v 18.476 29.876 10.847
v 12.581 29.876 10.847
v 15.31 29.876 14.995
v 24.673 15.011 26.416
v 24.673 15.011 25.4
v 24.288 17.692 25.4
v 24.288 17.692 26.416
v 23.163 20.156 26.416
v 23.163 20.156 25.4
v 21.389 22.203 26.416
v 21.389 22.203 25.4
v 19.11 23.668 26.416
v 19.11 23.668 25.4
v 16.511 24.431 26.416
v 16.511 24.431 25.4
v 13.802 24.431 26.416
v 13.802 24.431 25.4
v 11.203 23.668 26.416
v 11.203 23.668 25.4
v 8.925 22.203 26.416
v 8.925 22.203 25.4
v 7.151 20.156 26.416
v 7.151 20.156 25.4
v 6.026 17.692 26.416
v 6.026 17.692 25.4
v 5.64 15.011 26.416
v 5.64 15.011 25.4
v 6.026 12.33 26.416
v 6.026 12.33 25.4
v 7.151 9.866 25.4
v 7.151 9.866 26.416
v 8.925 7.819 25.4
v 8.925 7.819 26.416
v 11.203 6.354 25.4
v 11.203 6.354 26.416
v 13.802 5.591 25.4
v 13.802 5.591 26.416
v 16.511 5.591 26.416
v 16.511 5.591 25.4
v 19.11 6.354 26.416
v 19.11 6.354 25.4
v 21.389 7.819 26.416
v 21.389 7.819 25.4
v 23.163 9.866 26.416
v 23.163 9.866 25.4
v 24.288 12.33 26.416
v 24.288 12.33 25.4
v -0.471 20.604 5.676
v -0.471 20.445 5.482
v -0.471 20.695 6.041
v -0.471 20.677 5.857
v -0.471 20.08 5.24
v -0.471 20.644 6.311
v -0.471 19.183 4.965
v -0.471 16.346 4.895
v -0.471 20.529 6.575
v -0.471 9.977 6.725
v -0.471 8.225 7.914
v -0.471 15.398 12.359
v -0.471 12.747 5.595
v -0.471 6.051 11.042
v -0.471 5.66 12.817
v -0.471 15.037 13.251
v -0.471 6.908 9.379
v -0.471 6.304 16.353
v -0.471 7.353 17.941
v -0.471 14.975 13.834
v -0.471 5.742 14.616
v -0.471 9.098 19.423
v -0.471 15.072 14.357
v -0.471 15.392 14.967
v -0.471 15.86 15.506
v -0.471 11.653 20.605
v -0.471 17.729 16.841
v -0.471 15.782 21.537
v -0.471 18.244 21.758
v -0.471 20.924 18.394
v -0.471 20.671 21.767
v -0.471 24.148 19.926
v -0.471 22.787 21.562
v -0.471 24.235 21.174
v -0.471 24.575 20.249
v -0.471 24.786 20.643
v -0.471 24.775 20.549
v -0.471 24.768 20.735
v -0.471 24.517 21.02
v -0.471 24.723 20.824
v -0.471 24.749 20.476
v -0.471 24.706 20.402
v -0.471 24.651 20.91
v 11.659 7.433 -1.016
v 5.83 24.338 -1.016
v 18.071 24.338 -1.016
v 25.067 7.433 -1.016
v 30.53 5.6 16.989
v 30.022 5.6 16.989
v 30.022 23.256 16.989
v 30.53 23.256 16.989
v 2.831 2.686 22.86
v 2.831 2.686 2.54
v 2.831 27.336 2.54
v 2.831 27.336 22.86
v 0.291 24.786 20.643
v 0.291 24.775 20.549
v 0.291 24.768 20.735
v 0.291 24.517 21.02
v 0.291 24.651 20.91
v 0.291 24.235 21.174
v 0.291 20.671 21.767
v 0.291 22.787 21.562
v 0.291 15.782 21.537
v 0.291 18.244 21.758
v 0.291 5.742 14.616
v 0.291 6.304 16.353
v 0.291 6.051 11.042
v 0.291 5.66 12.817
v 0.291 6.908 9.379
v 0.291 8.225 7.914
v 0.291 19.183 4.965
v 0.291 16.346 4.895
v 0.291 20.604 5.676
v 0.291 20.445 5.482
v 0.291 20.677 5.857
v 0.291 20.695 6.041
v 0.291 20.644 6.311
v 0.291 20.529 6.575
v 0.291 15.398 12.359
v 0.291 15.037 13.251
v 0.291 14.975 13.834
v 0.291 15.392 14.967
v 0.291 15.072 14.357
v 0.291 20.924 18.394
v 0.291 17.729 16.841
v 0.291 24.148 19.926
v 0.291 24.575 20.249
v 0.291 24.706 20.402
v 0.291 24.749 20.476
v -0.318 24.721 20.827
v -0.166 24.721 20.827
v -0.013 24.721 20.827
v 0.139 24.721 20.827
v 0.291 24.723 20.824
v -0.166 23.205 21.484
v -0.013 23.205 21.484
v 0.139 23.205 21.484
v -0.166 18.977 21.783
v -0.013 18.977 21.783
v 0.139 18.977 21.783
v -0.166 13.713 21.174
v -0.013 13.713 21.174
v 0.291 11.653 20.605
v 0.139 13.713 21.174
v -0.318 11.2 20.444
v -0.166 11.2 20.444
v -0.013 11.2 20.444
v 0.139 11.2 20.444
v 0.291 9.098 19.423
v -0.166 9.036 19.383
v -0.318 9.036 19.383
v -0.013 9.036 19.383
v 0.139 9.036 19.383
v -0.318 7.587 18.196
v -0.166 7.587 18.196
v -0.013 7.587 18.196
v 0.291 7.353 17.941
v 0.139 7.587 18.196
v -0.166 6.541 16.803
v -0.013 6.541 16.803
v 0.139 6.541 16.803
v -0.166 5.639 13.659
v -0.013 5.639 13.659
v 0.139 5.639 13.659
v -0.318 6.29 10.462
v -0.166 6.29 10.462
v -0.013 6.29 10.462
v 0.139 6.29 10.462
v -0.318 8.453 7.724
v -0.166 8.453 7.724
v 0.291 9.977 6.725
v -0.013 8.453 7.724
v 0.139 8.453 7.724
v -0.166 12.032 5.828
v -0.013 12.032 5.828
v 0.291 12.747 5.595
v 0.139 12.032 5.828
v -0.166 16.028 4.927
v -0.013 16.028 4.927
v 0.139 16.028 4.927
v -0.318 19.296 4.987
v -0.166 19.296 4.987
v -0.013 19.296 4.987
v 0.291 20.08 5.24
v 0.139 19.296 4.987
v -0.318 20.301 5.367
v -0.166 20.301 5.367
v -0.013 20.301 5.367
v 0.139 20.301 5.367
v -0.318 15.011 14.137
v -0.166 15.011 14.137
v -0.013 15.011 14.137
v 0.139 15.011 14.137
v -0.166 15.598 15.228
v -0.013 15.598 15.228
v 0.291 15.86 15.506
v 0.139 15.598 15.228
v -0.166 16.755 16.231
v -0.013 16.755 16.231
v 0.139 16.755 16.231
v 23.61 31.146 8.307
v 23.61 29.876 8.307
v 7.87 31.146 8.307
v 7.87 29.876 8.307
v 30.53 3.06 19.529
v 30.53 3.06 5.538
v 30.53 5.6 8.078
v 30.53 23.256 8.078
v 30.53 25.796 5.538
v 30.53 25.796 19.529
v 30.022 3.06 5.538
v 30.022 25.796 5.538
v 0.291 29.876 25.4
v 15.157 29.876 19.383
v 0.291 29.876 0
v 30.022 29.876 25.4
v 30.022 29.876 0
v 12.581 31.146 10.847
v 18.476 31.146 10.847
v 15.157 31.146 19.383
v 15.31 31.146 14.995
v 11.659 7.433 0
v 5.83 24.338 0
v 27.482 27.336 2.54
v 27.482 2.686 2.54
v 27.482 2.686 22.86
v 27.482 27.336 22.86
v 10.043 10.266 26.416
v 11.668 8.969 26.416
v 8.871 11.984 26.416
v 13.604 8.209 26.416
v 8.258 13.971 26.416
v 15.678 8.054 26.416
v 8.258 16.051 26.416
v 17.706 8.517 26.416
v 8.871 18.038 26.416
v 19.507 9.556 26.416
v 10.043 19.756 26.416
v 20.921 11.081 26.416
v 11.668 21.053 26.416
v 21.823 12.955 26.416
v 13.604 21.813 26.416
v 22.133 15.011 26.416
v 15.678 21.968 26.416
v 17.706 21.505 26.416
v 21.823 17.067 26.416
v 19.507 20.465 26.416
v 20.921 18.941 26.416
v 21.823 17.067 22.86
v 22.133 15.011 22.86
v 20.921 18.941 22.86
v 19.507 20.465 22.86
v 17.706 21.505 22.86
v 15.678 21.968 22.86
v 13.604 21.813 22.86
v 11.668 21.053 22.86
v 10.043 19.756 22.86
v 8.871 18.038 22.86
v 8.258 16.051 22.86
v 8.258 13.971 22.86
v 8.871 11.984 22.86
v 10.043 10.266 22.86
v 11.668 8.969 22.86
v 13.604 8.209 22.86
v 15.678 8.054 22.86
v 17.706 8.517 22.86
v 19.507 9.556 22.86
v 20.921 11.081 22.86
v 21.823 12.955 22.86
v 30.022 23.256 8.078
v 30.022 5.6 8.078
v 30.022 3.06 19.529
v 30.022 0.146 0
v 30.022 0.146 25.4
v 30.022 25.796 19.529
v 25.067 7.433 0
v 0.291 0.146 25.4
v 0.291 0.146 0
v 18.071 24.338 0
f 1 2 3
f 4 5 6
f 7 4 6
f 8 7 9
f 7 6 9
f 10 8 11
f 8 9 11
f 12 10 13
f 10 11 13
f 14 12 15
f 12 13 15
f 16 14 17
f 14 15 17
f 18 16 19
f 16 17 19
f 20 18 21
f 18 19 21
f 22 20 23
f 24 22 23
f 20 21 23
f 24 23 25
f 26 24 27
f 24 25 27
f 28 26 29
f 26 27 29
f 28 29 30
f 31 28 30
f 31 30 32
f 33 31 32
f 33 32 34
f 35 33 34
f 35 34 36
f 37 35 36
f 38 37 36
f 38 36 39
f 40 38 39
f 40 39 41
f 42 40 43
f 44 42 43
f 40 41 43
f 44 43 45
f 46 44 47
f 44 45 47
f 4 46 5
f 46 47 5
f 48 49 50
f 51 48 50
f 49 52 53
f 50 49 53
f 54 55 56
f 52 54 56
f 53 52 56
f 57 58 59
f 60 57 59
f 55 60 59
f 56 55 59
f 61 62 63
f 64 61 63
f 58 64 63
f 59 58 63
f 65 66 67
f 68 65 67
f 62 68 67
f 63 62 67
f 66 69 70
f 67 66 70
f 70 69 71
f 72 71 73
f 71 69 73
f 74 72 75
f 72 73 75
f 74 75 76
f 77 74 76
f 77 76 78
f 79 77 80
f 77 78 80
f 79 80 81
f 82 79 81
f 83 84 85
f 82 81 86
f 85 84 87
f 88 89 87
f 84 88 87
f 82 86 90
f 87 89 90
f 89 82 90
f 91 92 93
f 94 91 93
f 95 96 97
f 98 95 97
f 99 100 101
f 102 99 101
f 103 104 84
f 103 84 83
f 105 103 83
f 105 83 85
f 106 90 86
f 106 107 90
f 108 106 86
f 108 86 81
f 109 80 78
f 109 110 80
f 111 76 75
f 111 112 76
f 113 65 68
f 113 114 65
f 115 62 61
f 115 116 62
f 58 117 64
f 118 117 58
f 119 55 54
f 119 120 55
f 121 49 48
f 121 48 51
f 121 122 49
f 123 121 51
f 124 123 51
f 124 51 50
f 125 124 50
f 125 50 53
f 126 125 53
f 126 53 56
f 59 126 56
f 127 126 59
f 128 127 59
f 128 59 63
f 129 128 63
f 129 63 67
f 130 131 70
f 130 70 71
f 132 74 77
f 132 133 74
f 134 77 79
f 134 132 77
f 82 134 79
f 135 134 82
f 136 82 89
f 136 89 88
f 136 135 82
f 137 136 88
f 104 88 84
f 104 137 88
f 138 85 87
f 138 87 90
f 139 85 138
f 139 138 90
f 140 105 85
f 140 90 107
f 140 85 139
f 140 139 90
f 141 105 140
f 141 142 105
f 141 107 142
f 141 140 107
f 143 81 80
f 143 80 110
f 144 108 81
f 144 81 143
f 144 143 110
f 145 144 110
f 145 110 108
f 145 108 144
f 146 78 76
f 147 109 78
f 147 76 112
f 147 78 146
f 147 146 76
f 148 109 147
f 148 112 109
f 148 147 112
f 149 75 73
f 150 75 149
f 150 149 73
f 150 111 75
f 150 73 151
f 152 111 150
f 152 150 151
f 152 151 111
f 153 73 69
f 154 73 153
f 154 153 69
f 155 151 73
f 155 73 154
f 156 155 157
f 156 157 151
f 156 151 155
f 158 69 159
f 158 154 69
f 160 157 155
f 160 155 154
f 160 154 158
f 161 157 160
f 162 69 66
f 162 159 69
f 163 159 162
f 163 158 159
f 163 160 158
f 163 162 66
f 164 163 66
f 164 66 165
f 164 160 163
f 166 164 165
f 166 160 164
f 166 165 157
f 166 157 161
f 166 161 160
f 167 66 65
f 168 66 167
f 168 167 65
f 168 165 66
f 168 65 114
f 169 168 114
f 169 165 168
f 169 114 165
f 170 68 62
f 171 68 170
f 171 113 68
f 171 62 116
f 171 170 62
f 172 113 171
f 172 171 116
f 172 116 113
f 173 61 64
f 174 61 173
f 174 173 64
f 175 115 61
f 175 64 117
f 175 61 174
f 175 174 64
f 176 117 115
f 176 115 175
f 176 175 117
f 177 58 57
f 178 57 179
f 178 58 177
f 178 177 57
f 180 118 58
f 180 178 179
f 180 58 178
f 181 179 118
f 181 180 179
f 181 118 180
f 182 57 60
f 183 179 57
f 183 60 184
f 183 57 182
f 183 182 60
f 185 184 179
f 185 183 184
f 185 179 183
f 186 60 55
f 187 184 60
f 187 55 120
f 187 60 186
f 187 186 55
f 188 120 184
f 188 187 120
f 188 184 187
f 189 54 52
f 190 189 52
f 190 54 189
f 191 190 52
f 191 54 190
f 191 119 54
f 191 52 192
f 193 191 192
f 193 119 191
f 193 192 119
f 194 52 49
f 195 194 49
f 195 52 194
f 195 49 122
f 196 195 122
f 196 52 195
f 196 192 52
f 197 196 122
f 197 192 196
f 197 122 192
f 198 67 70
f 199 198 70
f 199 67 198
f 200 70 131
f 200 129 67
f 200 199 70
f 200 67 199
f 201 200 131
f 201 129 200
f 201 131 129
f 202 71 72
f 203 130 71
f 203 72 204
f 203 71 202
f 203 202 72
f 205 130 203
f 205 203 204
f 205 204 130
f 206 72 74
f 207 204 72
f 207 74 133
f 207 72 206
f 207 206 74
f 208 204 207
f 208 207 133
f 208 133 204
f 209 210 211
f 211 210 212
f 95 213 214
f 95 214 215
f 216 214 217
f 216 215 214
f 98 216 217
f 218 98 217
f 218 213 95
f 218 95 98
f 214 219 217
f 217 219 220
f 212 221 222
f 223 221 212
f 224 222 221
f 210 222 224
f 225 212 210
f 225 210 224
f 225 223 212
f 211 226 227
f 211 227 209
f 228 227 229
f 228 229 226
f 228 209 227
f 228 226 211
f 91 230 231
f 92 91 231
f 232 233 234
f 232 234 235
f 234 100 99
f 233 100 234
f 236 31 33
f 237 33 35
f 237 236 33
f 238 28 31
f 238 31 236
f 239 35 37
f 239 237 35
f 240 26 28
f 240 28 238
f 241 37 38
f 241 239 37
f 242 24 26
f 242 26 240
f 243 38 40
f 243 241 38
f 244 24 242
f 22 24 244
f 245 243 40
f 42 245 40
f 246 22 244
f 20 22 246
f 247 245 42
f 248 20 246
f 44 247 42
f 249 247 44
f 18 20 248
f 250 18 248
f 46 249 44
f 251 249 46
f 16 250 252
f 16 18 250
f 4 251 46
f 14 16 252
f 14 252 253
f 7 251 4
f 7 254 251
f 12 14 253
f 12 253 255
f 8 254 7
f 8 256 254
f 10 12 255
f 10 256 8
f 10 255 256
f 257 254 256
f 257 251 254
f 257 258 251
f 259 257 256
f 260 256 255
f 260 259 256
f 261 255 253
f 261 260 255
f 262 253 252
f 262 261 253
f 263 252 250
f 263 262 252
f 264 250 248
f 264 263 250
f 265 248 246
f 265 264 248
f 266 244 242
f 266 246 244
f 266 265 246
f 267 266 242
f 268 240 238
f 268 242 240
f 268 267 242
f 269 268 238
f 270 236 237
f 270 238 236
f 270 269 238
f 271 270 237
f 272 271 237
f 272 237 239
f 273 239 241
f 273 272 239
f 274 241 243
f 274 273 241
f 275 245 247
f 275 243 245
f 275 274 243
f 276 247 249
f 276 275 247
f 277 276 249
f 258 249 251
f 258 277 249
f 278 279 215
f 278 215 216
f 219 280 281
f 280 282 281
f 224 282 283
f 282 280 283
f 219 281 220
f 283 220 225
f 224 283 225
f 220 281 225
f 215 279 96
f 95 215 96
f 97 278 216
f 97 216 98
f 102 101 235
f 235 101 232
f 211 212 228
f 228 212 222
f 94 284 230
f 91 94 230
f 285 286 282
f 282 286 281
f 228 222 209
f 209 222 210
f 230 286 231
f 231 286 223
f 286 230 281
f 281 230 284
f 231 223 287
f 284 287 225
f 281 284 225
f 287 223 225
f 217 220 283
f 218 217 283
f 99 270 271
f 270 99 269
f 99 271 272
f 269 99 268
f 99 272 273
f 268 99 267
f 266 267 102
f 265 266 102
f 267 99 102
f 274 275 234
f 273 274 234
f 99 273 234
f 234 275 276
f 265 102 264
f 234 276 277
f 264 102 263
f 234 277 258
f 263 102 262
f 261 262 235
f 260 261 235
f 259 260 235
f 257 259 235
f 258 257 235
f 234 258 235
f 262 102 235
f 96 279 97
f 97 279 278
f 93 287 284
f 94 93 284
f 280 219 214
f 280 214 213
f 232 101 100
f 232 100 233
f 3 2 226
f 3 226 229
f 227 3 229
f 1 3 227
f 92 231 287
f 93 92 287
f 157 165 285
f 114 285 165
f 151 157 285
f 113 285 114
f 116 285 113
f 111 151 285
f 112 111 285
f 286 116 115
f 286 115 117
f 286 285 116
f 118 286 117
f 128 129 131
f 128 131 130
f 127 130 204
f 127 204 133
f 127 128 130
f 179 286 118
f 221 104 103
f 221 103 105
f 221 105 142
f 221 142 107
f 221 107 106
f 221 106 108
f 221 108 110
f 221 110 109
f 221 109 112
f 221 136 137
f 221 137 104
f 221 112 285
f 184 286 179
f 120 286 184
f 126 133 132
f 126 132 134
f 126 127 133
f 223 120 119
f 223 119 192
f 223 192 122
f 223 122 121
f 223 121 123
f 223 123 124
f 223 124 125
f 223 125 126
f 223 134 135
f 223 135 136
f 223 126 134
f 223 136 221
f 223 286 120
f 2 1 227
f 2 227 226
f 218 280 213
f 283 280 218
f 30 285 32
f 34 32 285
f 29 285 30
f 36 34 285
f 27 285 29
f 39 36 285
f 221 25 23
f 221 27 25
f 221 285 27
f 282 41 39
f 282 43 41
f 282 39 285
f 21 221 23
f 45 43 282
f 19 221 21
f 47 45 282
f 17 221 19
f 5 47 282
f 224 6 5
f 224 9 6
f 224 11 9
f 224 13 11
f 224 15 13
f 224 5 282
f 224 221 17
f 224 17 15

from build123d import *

# Parameters (mm, degrees)
F0_W          = 29.7304940177
F0_H          = 29.7304925771
F1_DEPTH      = 25.4
F2_R          = 9.516573444
F3_DEPTH      = 1.016
F4_T          = -2.54
F5_W          = 22.7350834757
F5_H          = 13.9908185229
F6_DEPTH      = 0.508
F7_T          = 2.54
F7_T3_DEPTH   = 25.4
F7_T5_DEPTH   = 29.7304925771
F7_T7_DEPTH   = 29.7304940177
F7_T9_DEPTH   = 27.8150834757
F7_T11_DEPTH  = 19.0708185229
F9_DEPTH      = 1.27
F10_T         = 2.54
F10_T3_DEPTH  = 25.4
F10_T5_DEPTH  = 29.7304925771
F10_T7_DEPTH  = 29.7304940177
F10_T9_DEPTH  = 20.819671886
F10_T11_DEPTH = 19.0130124822
F10_T13_DEPTH = 18.3381282199
F10_T15_DEPTH = 27.8150834757
F10_T17_DEPTH = 19.0708185229
F10_T19_DEPTH = 22.7350834757
F10_T21_DEPTH = 5.588
F10_T23_DEPTH = 13.9908185229
F12_DEPTH     = 1.016
F14_DEPTH     = 0.762


# Not quite as in the source:
# - a shell that OpenCascade refuses in one call is made with other operations: the cavity is built on its own and cut out


with BuildPart() as f1:
    # F0 (on Top) → F1 (new body)
    with BuildSketch(Plane.XY):
        with Locations((15.1567222201, 15.010983996)):
            Rectangle(F0_W, F0_H)
    extrude(amount=F1_DEPTH)

    # F2 (on face) → F3 (join)
    with BuildSketch(Plane.XY.offset(25.4)):
        with Locations((15.1567222201, 15.010983996)):
            Circle(F2_R)
    extrude(amount=F3_DEPTH)

    # F4
    f4_openings = [f1.faces().sort_by_distance(p)[0] for p in [
        (15.156722, 15.010984, 26.416),
    ]]
    offset(amount=F4_T, openings=f4_openings, kind=Kind.INTERSECTION)

    # F5 (on face) → F6 (join)
    with BuildSketch(Plane.YZ.offset(30.021969229)):
        with Locations((14.4280334935, 12.5334435143)):
            Rectangle(F5_W, F5_H)
    extrude(amount=F6_DEPTH)

    # F7: shell of thickness 2.54, made by hand


with BuildPart() as f7_core1:
    # F7_t2: copy of F1
    add(f1.part)

    # the walls: a layer under each face that stays
    f7_faces = [f7_core1.faces().sort_by_distance(p)[0] for p in [
        (2.8314752113, 15.010983996, 12.7),
        (15.1567222201, 27.3362302846, 12.7),
        (6.9398908809, 6.794153137, 22.86),
        (15.1567222201, 2.6857377075, 12.7),
        (15.1567222201, 15.010983996, 2.54),
        (27.481969229, 15.010983996, 12.7),
        (8.1801487762, 15.010983996, 24.638),
        (8.8123399241, 8.6666017001, 26.416),
        (5.6401487762, 15.010983996, 25.908),
        (5.2465575476, 5.1008198037, 25.4),
        (0.2914752113, 15.010983996, 12.7),
        (15.1567222201, 29.8762302846, 12.7),
        (15.1567222201, 0.1457377075, 12.7),
        (30.021969229, 5.1008198037, 21.1666666667),
        (15.1567222201, 15.010983996, 0),
        (30.275969229, 14.4280334935, 5.5380342528),
        (30.275969229, 3.0604917556, 12.5334435143),
        (30.275969229, 14.4280334935, 19.5288527757),
        (30.275969229, 25.7955752313, 12.5334435143),
    ]]
    thicken(f7_faces, amount=-F7_T, mode=Mode.SUBTRACT)

    # F7_s4 → F7_t3 (cut)
    with BuildSketch(Plane.XY):
        Polygon((2.8568752113, 27.3108302846), (0.2914752113, 27.3362302846), (0.2914752113, 29.8762302846), (2.8314752113, 29.8762302846), align=None)
        Polygon((2.8568752113, 2.7111377075), (0.2914752113, 2.6857377075), (0.2914752113, 0.1457377075), (2.8314752113, 0.1457377075), align=None)
        Polygon((27.456569229, 27.3108302846), (27.481969229, 29.8762302846), (30.021969229, 29.8762302846), (30.021969229, 27.3362302846), align=None)
        Polygon((27.456569229, 2.7111377075), (27.481969229, 0.1457377075), (30.021969229, 0.1457377075), (30.021969229, 2.6857377075), align=None)
    extrude(amount=F7_T3_DEPTH, mode=Mode.SUBTRACT)

    # F7_s6 → F7_t5 (cut)
    with BuildSketch(Plane.XZ.offset(-29.8762302846)):
        Polygon((2.8568752113, 22.8346), (0.2914752113, 22.86), (0.2914752113, 25.4), (2.8314752113, 25.4), align=None)
        Polygon((2.8568752113, 2.5654), (0.2914752113, 2.54), (0.2914752113, 0), (2.8314752113, 0), align=None)
        Polygon((27.456569229, 22.8346), (27.481969229, 25.4), (30.021969229, 25.4), (30.021969229, 22.86), align=None)
        Polygon((27.456569229, 2.5654), (27.481969229, 0), (30.021969229, 0), (30.021969229, 2.54), align=None)
    extrude(amount=F7_T5_DEPTH, mode=Mode.SUBTRACT)

    # F7_s8 → F7_t7 (cut)
    with BuildSketch(Plane.YZ.offset(0.2914752113)):
        Polygon((27.3108302846, 22.8346), (29.8762302846, 22.86), (29.8762302846, 25.4), (27.3362302846, 25.4), align=None)
        Polygon((27.3108302846, 2.5654), (29.8762302846, 2.54), (29.8762302846, 0), (27.3362302846, 0), align=None)
        Polygon((2.7111377075, 22.8346), (2.6857377075, 25.4), (0.1457377075, 25.4), (0.1457377075, 22.86), align=None)
        Polygon((2.7111377075, 2.5654), (0.1457377075, 2.54), (0.1457377075, 0), (2.6857377075, 0), align=None)
    extrude(amount=F7_T7_DEPTH, mode=Mode.SUBTRACT)

    # F7_s10 → F7_t9 (cut)
    with BuildSketch(Plane.XZ.offset(-28.3355752313)):
        Polygon((30.047369229, 5.5126342528), (27.481969229, 5.5380342528), (27.481969229, 8.0780342528), (30.021969229, 8.0780342528), align=None)
        Polygon((30.047369229, 19.5542527757), (27.481969229, 19.5288527757), (27.481969229, 16.9888527757), (30.021969229, 16.9888527757), align=None)
    extrude(amount=F7_T9_DEPTH, mode=Mode.SUBTRACT)

    # F7_s12 → F7_t11 (cut)
    with BuildSketch(Plane.XY.offset(2.9980342528)):
        Polygon((30.047369229, 3.0350917556), (27.481969229, 3.0604917556), (27.481969229, 5.6004917556), (30.021969229, 5.6004917556), align=None)
        Polygon((30.047369229, 25.8209752313), (27.481969229, 25.7955752313), (27.481969229, 23.2555752313), (30.021969229, 23.2555752313), align=None)
    extrude(amount=F7_T11_DEPTH, mode=Mode.SUBTRACT)

    # F7_s13 → F7_t14 (revolve, cut)
    with BuildSketch(Plane.XZ.offset(-15.010983996)):
        Polygon((24.6986956641, 25.4254), (22.1332956641, 25.4), (22.1332956641, 22.86), (24.6732956641, 22.86), align=None)
    revolve(axis=Axis((15.1567222201, 15.010983996, 25.4), (0, 0, 1)), mode=Mode.SUBTRACT)


with BuildPart() as f1_1:
    add(f1.part)

    # what is left inside the walls is the cavity
    f7_cavity = [f7_core1.part.solids().sort_by_distance(p)[0] for p in [
        (30.047369, 14.428033, 14.01858),
    ]]
    add(f7_cavity, mode=Mode.SUBTRACT)

    # F8 (on face) → F9 (join)
    with BuildSketch(Plane(origin=(0, 29.8762302846, 0), x_dir=(-1, 0, 0), z_dir=(0, 1, 0))):
        Polygon((-7.869835943, 8.3070490509), (-15.1567222201, 19.3831156939), (-23.609507829, 8.3070490509), (-15.1567222201, 8.3070490509), align=None)
    extrude(amount=F9_DEPTH)

    # F10: shell of thickness 2.54, made by hand


with BuildPart() as f10_core1:
    # F10_t2: copy of F1
    add(f1_1.part)

    # the walls: a layer under each face that stays
    f10_faces = [f10_core1.faces().sort_by_distance(p)[0] for p in [
        (2.8314752113, 15.010983996, 12.7),
        (15.1567222201, 27.3362302846, 12.7),
        (6.9398908809, 6.794153137, 22.86),
        (15.1567222201, 2.6857377075, 12.7),
        (15.1567222201, 15.010983996, 2.54),
        (27.481969229, 15.010983996, 12.7),
        (8.1801487762, 15.010983996, 24.638),
        (8.8123399241, 8.6666017001, 26.416),
        (5.6401487762, 15.010983996, 25.908),
        (5.2465575476, 5.1008198037, 25.4),
        (0.2914752113, 15.010983996, 12.7),
        (25.0668868927, 29.8762302846, 21.1666666667),
        (15.1567222201, 0.1457377075, 12.7),
        (30.021969229, 5.1008198037, 21.1666666667),
        (15.1567222201, 15.010983996, 0),
        (15.739671886, 30.5112302846, 8.3070490509),
        (19.3831150245, 30.5112302846, 13.8450823724),
        (11.5132790816, 30.5112302846, 13.8450823724),
        (30.275969229, 14.4280334935, 5.5380342528),
        (30.275969229, 3.0604917556, 12.5334435143),
        (30.275969229, 14.4280334935, 19.5288527757),
        (30.275969229, 25.7955752313, 12.5334435143),
        (30.529969229, 6.8496723349, 7.86983734),
        (30.275969229, 14.4280334935, 8.0780342528),
        (30.275969229, 23.2555752313, 12.5334435143),
        (30.275969229, 14.4280334935, 16.9888527757),
        (30.275969229, 5.6004917556, 12.5334435143),
        (30.021969229, 14.4280334935, 12.5334435143),
    ]]
    thicken(f10_faces, amount=-F10_T, mode=Mode.SUBTRACT)

    # F10_s4 → F10_t3 (cut)
    with BuildSketch(Plane.XY):
        Polygon((2.8568752113, 27.3108302846), (0.2914752113, 27.3362302846), (0.2914752113, 29.8762302846), (2.8314752113, 29.8762302846), align=None)
        Polygon((2.8568752113, 2.7111377075), (0.2914752113, 2.6857377075), (0.2914752113, 0.1457377075), (2.8314752113, 0.1457377075), align=None)
        Polygon((27.456569229, 27.3108302846), (27.481969229, 29.8762302846), (30.021969229, 29.8762302846), (30.021969229, 27.3362302846), align=None)
        Polygon((27.456569229, 2.7111377075), (27.481969229, 0.1457377075), (30.021969229, 0.1457377075), (30.021969229, 2.6857377075), align=None)
    extrude(amount=F10_T3_DEPTH, mode=Mode.SUBTRACT)

    # F10_s6 → F10_t5 (cut)
    with BuildSketch(Plane.XZ.offset(-29.8762302846)):
        Polygon((2.8568752113, 22.8346), (0.2914752113, 22.86), (0.2914752113, 25.4), (2.8314752113, 25.4), align=None)
        Polygon((2.8568752113, 2.5654), (0.2914752113, 2.54), (0.2914752113, 0), (2.8314752113, 0), align=None)
        Polygon((27.456569229, 22.8346), (27.481969229, 25.4), (30.021969229, 25.4), (30.021969229, 22.86), align=None)
        Polygon((27.456569229, 2.5654), (27.481969229, 0), (30.021969229, 0), (30.021969229, 2.54), align=None)
    extrude(amount=F10_T5_DEPTH, mode=Mode.SUBTRACT)

    # F10_s8 → F10_t7 (cut)
    with BuildSketch(Plane.YZ.offset(0.2914752113)):
        Polygon((27.3108302846, 22.8346), (29.8762302846, 22.86), (29.8762302846, 25.4), (27.3362302846, 25.4), align=None)
        Polygon((27.3108302846, 2.5654), (29.8762302846, 2.54), (29.8762302846, 0), (27.3362302846, 0), align=None)
        Polygon((2.7111377075, 22.8346), (2.6857377075, 25.4), (0.1457377075, 25.4), (0.1457377075, 22.86), align=None)
        Polygon((2.7111377075, 2.5654), (0.1457377075, 2.54), (0.1457377075, 0), (2.6857377075, 0), align=None)
    extrude(amount=F10_T7_DEPTH, mode=Mode.SUBTRACT)

    # F10_s10 → F10_t9 (cut)
    with BuildSketch(Plane.YZ.offset(5.329835943)):
        Polygon((29.9016302846, 8.2816490509), (27.3362302846, 8.3070490509), (27.3362302846, 10.8470490509), (29.8762302846, 10.8470490509), align=None)
    extrude(amount=F10_T9_DEPTH, mode=Mode.SUBTRACT)

    # F10_s12 → F10_t11 (cut)
    with BuildSketch(Plane(origin=(-5.3104872769, 0, 6.9585712577), x_dir=(0, 1, 0), z_dir=(0.6066732244, 0, -0.7949513185))):
        Polygon((29.9016302846, 23.8334736105), (27.3362302846, 23.8080736105), (27.3362302846, 21.2680736105), (29.8762302846, 21.2680736105), align=None)
    extrude(amount=F10_T11_DEPTH, mode=Mode.SUBTRACT)

    # F10_s14 → F10_t13 (cut)
    with BuildSketch(Plane(origin=(4.7955373639, 0, 7.2892164652), x_dir=(0, 1, 0), z_dir=(0.5496165187, 0, 0.8354170709))):
        Polygon((29.9016302846, -1.9835039116), (27.3362302846, -2.0089039116), (27.3362302846, -4.5489039116), (29.8762302846, -4.5489039116), align=None)
    extrude(amount=F10_T13_DEPTH, mode=Mode.SUBTRACT)

    # F10_s16 → F10_t15 (cut)
    with BuildSketch(Plane.XZ.offset(-28.3355752313)):
        Polygon((30.047369229, 5.5126342528), (27.481969229, 5.5380342528), (27.481969229, 8.0780342528), (30.021969229, 8.0780342528), align=None)
        Polygon((30.047369229, 19.5542527757), (27.481969229, 19.5288527757), (27.481969229, 16.9888527757), (30.021969229, 16.9888527757), align=None)
    extrude(amount=F10_T15_DEPTH, mode=Mode.SUBTRACT)

    # F10_s18 → F10_t17 (cut)
    with BuildSketch(Plane.XY.offset(2.9980342528)):
        Polygon((30.047369229, 3.0350917556), (27.481969229, 3.0604917556), (27.481969229, 5.6004917556), (30.021969229, 5.6004917556), align=None)
        Polygon((30.047369229, 25.8209752313), (27.481969229, 25.7955752313), (27.481969229, 23.2555752313), (30.021969229, 23.2555752313), align=None)
    extrude(amount=F10_T17_DEPTH, mode=Mode.SUBTRACT)

    # F10_s20 → F10_t19 (cut)
    with BuildSketch(Plane.XZ.offset(-25.7955752313)):
        Polygon((30.047369229, 8.1034342528), (30.021969229, 5.5380342528), (27.481969229, 5.5380342528), (27.481969229, 8.0780342528), align=None)
        Polygon((30.047369229, 16.9634527757), (30.021969229, 19.5288527757), (27.481969229, 19.5288527757), (27.481969229, 16.9888527757), align=None)
    extrude(amount=F10_T19_DEPTH, mode=Mode.SUBTRACT)

    # F10_s22 → F10_t21 (cut)
    with BuildSketch(Plane.YZ.offset(27.481969229)):
        Polygon((23.2301752313, 8.1034342528), (23.2555752313, 5.5380342528), (25.7955752313, 5.5380342528), (25.7955752313, 8.0780342528), align=None)
        Polygon((5.6258917556, 8.1034342528), (5.6004917556, 5.5380342528), (3.0604917556, 5.5380342528), (3.0604917556, 8.0780342528), align=None)
        Polygon((23.2301752313, 16.9634527757), (25.7955752313, 16.9888527757), (25.7955752313, 19.5288527757), (23.2555752313, 19.5288527757), align=None)
        Polygon((5.6258917556, 16.9634527757), (5.6004917556, 19.5288527757), (3.0604917556, 19.5288527757), (3.0604917556, 16.9888527757), align=None)
    extrude(amount=F10_T21_DEPTH, mode=Mode.SUBTRACT)

    # F10_s24 → F10_t23 (cut)
    with BuildSketch(Plane.XY.offset(5.5380342528)):
        Polygon((30.047369229, 23.2301752313), (30.021969229, 25.7955752313), (27.481969229, 25.7955752313), (27.481969229, 23.2555752313), align=None)
        Polygon((30.047369229, 5.6258917556), (30.021969229, 3.0604917556), (27.481969229, 3.0604917556), (27.481969229, 5.6004917556), align=None)
    extrude(amount=F10_T23_DEPTH, mode=Mode.SUBTRACT)

    # F10_s25 → F10_t26 (revolve, cut)
    with BuildSketch(Plane.XZ.offset(-15.010983996)):
        Polygon((24.6986956641, 25.4254), (22.1332956641, 25.4), (22.1332956641, 22.86), (24.6732956641, 22.86), align=None)
    revolve(axis=Axis((15.1567222201, 15.010983996, 25.4), (0, 0, 1)), mode=Mode.SUBTRACT)


with BuildPart() as f1_2:
    add(f1_1.part)

    # what is left inside the walls is the cavity
    f10_cavity = [f10_core1.part.solids().sort_by_distance(p)[0] for p in [
        (15.528605, 29.90163, 13.612435),
    ]]
    add(f10_cavity, mode=Mode.SUBTRACT)

    # F11 (on face) → F12 (join)
    with BuildSketch(Plane(origin=(0, 0, 0), x_dir=(1, 0, 0), z_dir=(0, 0, -1))):
        Polygon((25.0668860972, -7.4326233007), (11.6590168327, -7.4326233007), (5.8295079507, -24.3381969631), (18.0714763701, -24.3381969631), align=None)
    extrude(amount=F12_DEPTH)

    # F13 (on face) → F14 (join)
    with BuildSketch(Plane(origin=(0.2914752113, 0, 0), x_dir=(0, -1, 0), z_dir=(-1, 0, 0))):
        with BuildLine():
            add(Edge.make_bspline(
                [(-24.775410071, 20.5490160733), (-25.1740933695, 22.0975250298), (-4.6873757083, 23.1826141504), (-4.5267621045, 4.9664176824), (-27.8896118654, 3.6395127919), (-7.5312359208, 15.2818602681), (-24.4324130709, 19.2167959159), (-24.775410071, 20.5490160733)],
                knots=[0, 0, 0, 0, 0.2273070421, 0.4227963447, 0.6240019215, 0.804442188, 1, 1, 1, 1], degree=3))
        make_face()
    extrude(amount=F14_DEPTH)


solid = f1_2.part
